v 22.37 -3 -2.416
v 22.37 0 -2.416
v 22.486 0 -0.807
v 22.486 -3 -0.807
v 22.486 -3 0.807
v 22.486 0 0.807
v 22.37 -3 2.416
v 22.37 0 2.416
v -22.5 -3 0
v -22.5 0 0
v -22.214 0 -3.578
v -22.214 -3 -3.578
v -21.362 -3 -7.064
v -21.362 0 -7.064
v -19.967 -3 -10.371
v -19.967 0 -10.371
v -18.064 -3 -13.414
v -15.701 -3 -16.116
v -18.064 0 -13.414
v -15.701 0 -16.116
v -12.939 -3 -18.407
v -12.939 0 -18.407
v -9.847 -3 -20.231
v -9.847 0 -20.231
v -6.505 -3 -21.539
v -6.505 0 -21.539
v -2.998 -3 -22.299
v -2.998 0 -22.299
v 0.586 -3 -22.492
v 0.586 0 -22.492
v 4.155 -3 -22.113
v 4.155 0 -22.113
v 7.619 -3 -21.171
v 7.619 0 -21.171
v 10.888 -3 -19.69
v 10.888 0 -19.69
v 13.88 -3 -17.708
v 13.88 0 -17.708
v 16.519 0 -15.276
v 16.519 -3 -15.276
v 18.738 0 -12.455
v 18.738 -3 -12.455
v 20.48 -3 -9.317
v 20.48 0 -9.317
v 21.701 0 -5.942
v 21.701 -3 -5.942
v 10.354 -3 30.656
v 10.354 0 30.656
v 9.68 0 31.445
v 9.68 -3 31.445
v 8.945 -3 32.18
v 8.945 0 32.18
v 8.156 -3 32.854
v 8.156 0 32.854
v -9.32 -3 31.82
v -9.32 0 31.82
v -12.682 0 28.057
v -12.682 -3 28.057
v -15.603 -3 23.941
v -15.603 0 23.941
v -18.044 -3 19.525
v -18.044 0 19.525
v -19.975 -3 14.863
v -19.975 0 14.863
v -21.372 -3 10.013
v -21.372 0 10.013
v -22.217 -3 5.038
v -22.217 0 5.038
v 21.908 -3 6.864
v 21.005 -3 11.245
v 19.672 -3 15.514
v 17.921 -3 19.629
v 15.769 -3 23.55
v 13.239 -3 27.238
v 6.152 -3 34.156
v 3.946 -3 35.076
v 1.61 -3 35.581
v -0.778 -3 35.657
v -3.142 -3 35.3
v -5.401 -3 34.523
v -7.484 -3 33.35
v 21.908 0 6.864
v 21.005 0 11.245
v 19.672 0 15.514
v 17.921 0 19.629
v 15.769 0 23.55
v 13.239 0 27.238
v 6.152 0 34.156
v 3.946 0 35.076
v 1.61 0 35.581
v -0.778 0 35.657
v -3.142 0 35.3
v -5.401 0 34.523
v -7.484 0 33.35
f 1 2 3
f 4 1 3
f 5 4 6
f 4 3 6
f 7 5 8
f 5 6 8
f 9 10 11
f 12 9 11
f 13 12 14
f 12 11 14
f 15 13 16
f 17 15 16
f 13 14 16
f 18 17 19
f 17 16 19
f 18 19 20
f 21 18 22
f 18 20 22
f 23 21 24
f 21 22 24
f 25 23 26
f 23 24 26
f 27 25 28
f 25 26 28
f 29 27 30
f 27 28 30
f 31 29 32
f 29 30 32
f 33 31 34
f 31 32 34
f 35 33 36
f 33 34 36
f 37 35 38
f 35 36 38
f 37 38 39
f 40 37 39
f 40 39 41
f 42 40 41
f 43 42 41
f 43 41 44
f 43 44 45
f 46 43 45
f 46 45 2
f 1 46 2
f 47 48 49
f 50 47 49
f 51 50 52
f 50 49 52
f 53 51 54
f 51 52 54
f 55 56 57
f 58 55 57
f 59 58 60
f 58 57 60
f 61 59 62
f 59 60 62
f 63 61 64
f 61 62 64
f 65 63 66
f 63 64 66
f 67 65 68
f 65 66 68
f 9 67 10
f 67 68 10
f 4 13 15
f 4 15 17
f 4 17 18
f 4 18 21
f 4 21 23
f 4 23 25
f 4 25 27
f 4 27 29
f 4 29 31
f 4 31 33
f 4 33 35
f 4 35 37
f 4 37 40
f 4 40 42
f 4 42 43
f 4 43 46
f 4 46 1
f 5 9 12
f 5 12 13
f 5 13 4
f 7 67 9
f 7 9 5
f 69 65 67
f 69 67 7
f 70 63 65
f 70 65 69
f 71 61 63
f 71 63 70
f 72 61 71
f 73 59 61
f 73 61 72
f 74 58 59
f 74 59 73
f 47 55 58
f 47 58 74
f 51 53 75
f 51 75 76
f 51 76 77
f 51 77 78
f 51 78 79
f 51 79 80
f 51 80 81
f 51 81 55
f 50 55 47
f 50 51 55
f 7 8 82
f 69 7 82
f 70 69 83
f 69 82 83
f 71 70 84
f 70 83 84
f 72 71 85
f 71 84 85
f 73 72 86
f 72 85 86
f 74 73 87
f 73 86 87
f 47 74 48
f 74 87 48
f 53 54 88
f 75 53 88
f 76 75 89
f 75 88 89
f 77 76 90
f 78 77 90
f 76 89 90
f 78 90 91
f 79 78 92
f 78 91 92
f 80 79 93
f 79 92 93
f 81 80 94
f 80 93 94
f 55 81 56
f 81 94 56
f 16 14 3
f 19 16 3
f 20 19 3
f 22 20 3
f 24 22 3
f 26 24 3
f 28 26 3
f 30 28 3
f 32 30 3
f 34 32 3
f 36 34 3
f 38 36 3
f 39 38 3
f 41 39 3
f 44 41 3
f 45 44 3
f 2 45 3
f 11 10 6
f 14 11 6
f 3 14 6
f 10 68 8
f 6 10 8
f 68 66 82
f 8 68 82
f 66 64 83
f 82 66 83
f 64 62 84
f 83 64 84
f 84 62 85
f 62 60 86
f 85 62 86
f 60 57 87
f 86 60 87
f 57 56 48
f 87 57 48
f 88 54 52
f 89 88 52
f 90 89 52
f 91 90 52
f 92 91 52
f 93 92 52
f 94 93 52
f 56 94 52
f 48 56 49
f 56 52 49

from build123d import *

# Parameters (mm, degrees)
F1_DEPTH = 3


with BuildPart() as f1:
    # F0 (on Front) → F1 (new body)
    with BuildSketch(Plane.XZ):
        with BuildLine():
            ThreePointArc((-9.319805, 31.819805), (-19.074579, 17.220754), (-22.5, 0))
            ThreePointArc((-22.5, 0), (-1.209572, -22.467464), (22.36995, -2.415646))
            ThreePointArc((22.36995, -2.415646), (22.434928, 0), (22.36995, 2.415646))
            ThreePointArc((22.36995, 2.415646), (18.847563, 17.593372), (10.353786, 30.655774))
            ThreePointArc((10.353786, 30.655774), (9.273792, 31.773792), (8.155774, 32.853786))
            ThreePointArc((8.155774, 32.853786), (-0.778474, 35.657185), (-9.319805, 31.819805))
        make_face()
        with BuildLine():
            ThreePointArc((22.36995, 2.415646), (22.434928, 0), (22.36995, -2.415646))
            ThreePointArc((22.36995, -2.415646), (22.5, 0), (22.36995, 2.415646))
        make_face()
        with BuildLine():
            ThreePointArc((10.353786, 30.655774), (9.319805, 31.819805), (8.155774, 32.853786))
            ThreePointArc((8.155774, 32.853786), (9.273792, 31.773792), (10.353786, 30.655774))
        make_face()
    extrude(amount=F1_DEPTH)


solid = f1.part
